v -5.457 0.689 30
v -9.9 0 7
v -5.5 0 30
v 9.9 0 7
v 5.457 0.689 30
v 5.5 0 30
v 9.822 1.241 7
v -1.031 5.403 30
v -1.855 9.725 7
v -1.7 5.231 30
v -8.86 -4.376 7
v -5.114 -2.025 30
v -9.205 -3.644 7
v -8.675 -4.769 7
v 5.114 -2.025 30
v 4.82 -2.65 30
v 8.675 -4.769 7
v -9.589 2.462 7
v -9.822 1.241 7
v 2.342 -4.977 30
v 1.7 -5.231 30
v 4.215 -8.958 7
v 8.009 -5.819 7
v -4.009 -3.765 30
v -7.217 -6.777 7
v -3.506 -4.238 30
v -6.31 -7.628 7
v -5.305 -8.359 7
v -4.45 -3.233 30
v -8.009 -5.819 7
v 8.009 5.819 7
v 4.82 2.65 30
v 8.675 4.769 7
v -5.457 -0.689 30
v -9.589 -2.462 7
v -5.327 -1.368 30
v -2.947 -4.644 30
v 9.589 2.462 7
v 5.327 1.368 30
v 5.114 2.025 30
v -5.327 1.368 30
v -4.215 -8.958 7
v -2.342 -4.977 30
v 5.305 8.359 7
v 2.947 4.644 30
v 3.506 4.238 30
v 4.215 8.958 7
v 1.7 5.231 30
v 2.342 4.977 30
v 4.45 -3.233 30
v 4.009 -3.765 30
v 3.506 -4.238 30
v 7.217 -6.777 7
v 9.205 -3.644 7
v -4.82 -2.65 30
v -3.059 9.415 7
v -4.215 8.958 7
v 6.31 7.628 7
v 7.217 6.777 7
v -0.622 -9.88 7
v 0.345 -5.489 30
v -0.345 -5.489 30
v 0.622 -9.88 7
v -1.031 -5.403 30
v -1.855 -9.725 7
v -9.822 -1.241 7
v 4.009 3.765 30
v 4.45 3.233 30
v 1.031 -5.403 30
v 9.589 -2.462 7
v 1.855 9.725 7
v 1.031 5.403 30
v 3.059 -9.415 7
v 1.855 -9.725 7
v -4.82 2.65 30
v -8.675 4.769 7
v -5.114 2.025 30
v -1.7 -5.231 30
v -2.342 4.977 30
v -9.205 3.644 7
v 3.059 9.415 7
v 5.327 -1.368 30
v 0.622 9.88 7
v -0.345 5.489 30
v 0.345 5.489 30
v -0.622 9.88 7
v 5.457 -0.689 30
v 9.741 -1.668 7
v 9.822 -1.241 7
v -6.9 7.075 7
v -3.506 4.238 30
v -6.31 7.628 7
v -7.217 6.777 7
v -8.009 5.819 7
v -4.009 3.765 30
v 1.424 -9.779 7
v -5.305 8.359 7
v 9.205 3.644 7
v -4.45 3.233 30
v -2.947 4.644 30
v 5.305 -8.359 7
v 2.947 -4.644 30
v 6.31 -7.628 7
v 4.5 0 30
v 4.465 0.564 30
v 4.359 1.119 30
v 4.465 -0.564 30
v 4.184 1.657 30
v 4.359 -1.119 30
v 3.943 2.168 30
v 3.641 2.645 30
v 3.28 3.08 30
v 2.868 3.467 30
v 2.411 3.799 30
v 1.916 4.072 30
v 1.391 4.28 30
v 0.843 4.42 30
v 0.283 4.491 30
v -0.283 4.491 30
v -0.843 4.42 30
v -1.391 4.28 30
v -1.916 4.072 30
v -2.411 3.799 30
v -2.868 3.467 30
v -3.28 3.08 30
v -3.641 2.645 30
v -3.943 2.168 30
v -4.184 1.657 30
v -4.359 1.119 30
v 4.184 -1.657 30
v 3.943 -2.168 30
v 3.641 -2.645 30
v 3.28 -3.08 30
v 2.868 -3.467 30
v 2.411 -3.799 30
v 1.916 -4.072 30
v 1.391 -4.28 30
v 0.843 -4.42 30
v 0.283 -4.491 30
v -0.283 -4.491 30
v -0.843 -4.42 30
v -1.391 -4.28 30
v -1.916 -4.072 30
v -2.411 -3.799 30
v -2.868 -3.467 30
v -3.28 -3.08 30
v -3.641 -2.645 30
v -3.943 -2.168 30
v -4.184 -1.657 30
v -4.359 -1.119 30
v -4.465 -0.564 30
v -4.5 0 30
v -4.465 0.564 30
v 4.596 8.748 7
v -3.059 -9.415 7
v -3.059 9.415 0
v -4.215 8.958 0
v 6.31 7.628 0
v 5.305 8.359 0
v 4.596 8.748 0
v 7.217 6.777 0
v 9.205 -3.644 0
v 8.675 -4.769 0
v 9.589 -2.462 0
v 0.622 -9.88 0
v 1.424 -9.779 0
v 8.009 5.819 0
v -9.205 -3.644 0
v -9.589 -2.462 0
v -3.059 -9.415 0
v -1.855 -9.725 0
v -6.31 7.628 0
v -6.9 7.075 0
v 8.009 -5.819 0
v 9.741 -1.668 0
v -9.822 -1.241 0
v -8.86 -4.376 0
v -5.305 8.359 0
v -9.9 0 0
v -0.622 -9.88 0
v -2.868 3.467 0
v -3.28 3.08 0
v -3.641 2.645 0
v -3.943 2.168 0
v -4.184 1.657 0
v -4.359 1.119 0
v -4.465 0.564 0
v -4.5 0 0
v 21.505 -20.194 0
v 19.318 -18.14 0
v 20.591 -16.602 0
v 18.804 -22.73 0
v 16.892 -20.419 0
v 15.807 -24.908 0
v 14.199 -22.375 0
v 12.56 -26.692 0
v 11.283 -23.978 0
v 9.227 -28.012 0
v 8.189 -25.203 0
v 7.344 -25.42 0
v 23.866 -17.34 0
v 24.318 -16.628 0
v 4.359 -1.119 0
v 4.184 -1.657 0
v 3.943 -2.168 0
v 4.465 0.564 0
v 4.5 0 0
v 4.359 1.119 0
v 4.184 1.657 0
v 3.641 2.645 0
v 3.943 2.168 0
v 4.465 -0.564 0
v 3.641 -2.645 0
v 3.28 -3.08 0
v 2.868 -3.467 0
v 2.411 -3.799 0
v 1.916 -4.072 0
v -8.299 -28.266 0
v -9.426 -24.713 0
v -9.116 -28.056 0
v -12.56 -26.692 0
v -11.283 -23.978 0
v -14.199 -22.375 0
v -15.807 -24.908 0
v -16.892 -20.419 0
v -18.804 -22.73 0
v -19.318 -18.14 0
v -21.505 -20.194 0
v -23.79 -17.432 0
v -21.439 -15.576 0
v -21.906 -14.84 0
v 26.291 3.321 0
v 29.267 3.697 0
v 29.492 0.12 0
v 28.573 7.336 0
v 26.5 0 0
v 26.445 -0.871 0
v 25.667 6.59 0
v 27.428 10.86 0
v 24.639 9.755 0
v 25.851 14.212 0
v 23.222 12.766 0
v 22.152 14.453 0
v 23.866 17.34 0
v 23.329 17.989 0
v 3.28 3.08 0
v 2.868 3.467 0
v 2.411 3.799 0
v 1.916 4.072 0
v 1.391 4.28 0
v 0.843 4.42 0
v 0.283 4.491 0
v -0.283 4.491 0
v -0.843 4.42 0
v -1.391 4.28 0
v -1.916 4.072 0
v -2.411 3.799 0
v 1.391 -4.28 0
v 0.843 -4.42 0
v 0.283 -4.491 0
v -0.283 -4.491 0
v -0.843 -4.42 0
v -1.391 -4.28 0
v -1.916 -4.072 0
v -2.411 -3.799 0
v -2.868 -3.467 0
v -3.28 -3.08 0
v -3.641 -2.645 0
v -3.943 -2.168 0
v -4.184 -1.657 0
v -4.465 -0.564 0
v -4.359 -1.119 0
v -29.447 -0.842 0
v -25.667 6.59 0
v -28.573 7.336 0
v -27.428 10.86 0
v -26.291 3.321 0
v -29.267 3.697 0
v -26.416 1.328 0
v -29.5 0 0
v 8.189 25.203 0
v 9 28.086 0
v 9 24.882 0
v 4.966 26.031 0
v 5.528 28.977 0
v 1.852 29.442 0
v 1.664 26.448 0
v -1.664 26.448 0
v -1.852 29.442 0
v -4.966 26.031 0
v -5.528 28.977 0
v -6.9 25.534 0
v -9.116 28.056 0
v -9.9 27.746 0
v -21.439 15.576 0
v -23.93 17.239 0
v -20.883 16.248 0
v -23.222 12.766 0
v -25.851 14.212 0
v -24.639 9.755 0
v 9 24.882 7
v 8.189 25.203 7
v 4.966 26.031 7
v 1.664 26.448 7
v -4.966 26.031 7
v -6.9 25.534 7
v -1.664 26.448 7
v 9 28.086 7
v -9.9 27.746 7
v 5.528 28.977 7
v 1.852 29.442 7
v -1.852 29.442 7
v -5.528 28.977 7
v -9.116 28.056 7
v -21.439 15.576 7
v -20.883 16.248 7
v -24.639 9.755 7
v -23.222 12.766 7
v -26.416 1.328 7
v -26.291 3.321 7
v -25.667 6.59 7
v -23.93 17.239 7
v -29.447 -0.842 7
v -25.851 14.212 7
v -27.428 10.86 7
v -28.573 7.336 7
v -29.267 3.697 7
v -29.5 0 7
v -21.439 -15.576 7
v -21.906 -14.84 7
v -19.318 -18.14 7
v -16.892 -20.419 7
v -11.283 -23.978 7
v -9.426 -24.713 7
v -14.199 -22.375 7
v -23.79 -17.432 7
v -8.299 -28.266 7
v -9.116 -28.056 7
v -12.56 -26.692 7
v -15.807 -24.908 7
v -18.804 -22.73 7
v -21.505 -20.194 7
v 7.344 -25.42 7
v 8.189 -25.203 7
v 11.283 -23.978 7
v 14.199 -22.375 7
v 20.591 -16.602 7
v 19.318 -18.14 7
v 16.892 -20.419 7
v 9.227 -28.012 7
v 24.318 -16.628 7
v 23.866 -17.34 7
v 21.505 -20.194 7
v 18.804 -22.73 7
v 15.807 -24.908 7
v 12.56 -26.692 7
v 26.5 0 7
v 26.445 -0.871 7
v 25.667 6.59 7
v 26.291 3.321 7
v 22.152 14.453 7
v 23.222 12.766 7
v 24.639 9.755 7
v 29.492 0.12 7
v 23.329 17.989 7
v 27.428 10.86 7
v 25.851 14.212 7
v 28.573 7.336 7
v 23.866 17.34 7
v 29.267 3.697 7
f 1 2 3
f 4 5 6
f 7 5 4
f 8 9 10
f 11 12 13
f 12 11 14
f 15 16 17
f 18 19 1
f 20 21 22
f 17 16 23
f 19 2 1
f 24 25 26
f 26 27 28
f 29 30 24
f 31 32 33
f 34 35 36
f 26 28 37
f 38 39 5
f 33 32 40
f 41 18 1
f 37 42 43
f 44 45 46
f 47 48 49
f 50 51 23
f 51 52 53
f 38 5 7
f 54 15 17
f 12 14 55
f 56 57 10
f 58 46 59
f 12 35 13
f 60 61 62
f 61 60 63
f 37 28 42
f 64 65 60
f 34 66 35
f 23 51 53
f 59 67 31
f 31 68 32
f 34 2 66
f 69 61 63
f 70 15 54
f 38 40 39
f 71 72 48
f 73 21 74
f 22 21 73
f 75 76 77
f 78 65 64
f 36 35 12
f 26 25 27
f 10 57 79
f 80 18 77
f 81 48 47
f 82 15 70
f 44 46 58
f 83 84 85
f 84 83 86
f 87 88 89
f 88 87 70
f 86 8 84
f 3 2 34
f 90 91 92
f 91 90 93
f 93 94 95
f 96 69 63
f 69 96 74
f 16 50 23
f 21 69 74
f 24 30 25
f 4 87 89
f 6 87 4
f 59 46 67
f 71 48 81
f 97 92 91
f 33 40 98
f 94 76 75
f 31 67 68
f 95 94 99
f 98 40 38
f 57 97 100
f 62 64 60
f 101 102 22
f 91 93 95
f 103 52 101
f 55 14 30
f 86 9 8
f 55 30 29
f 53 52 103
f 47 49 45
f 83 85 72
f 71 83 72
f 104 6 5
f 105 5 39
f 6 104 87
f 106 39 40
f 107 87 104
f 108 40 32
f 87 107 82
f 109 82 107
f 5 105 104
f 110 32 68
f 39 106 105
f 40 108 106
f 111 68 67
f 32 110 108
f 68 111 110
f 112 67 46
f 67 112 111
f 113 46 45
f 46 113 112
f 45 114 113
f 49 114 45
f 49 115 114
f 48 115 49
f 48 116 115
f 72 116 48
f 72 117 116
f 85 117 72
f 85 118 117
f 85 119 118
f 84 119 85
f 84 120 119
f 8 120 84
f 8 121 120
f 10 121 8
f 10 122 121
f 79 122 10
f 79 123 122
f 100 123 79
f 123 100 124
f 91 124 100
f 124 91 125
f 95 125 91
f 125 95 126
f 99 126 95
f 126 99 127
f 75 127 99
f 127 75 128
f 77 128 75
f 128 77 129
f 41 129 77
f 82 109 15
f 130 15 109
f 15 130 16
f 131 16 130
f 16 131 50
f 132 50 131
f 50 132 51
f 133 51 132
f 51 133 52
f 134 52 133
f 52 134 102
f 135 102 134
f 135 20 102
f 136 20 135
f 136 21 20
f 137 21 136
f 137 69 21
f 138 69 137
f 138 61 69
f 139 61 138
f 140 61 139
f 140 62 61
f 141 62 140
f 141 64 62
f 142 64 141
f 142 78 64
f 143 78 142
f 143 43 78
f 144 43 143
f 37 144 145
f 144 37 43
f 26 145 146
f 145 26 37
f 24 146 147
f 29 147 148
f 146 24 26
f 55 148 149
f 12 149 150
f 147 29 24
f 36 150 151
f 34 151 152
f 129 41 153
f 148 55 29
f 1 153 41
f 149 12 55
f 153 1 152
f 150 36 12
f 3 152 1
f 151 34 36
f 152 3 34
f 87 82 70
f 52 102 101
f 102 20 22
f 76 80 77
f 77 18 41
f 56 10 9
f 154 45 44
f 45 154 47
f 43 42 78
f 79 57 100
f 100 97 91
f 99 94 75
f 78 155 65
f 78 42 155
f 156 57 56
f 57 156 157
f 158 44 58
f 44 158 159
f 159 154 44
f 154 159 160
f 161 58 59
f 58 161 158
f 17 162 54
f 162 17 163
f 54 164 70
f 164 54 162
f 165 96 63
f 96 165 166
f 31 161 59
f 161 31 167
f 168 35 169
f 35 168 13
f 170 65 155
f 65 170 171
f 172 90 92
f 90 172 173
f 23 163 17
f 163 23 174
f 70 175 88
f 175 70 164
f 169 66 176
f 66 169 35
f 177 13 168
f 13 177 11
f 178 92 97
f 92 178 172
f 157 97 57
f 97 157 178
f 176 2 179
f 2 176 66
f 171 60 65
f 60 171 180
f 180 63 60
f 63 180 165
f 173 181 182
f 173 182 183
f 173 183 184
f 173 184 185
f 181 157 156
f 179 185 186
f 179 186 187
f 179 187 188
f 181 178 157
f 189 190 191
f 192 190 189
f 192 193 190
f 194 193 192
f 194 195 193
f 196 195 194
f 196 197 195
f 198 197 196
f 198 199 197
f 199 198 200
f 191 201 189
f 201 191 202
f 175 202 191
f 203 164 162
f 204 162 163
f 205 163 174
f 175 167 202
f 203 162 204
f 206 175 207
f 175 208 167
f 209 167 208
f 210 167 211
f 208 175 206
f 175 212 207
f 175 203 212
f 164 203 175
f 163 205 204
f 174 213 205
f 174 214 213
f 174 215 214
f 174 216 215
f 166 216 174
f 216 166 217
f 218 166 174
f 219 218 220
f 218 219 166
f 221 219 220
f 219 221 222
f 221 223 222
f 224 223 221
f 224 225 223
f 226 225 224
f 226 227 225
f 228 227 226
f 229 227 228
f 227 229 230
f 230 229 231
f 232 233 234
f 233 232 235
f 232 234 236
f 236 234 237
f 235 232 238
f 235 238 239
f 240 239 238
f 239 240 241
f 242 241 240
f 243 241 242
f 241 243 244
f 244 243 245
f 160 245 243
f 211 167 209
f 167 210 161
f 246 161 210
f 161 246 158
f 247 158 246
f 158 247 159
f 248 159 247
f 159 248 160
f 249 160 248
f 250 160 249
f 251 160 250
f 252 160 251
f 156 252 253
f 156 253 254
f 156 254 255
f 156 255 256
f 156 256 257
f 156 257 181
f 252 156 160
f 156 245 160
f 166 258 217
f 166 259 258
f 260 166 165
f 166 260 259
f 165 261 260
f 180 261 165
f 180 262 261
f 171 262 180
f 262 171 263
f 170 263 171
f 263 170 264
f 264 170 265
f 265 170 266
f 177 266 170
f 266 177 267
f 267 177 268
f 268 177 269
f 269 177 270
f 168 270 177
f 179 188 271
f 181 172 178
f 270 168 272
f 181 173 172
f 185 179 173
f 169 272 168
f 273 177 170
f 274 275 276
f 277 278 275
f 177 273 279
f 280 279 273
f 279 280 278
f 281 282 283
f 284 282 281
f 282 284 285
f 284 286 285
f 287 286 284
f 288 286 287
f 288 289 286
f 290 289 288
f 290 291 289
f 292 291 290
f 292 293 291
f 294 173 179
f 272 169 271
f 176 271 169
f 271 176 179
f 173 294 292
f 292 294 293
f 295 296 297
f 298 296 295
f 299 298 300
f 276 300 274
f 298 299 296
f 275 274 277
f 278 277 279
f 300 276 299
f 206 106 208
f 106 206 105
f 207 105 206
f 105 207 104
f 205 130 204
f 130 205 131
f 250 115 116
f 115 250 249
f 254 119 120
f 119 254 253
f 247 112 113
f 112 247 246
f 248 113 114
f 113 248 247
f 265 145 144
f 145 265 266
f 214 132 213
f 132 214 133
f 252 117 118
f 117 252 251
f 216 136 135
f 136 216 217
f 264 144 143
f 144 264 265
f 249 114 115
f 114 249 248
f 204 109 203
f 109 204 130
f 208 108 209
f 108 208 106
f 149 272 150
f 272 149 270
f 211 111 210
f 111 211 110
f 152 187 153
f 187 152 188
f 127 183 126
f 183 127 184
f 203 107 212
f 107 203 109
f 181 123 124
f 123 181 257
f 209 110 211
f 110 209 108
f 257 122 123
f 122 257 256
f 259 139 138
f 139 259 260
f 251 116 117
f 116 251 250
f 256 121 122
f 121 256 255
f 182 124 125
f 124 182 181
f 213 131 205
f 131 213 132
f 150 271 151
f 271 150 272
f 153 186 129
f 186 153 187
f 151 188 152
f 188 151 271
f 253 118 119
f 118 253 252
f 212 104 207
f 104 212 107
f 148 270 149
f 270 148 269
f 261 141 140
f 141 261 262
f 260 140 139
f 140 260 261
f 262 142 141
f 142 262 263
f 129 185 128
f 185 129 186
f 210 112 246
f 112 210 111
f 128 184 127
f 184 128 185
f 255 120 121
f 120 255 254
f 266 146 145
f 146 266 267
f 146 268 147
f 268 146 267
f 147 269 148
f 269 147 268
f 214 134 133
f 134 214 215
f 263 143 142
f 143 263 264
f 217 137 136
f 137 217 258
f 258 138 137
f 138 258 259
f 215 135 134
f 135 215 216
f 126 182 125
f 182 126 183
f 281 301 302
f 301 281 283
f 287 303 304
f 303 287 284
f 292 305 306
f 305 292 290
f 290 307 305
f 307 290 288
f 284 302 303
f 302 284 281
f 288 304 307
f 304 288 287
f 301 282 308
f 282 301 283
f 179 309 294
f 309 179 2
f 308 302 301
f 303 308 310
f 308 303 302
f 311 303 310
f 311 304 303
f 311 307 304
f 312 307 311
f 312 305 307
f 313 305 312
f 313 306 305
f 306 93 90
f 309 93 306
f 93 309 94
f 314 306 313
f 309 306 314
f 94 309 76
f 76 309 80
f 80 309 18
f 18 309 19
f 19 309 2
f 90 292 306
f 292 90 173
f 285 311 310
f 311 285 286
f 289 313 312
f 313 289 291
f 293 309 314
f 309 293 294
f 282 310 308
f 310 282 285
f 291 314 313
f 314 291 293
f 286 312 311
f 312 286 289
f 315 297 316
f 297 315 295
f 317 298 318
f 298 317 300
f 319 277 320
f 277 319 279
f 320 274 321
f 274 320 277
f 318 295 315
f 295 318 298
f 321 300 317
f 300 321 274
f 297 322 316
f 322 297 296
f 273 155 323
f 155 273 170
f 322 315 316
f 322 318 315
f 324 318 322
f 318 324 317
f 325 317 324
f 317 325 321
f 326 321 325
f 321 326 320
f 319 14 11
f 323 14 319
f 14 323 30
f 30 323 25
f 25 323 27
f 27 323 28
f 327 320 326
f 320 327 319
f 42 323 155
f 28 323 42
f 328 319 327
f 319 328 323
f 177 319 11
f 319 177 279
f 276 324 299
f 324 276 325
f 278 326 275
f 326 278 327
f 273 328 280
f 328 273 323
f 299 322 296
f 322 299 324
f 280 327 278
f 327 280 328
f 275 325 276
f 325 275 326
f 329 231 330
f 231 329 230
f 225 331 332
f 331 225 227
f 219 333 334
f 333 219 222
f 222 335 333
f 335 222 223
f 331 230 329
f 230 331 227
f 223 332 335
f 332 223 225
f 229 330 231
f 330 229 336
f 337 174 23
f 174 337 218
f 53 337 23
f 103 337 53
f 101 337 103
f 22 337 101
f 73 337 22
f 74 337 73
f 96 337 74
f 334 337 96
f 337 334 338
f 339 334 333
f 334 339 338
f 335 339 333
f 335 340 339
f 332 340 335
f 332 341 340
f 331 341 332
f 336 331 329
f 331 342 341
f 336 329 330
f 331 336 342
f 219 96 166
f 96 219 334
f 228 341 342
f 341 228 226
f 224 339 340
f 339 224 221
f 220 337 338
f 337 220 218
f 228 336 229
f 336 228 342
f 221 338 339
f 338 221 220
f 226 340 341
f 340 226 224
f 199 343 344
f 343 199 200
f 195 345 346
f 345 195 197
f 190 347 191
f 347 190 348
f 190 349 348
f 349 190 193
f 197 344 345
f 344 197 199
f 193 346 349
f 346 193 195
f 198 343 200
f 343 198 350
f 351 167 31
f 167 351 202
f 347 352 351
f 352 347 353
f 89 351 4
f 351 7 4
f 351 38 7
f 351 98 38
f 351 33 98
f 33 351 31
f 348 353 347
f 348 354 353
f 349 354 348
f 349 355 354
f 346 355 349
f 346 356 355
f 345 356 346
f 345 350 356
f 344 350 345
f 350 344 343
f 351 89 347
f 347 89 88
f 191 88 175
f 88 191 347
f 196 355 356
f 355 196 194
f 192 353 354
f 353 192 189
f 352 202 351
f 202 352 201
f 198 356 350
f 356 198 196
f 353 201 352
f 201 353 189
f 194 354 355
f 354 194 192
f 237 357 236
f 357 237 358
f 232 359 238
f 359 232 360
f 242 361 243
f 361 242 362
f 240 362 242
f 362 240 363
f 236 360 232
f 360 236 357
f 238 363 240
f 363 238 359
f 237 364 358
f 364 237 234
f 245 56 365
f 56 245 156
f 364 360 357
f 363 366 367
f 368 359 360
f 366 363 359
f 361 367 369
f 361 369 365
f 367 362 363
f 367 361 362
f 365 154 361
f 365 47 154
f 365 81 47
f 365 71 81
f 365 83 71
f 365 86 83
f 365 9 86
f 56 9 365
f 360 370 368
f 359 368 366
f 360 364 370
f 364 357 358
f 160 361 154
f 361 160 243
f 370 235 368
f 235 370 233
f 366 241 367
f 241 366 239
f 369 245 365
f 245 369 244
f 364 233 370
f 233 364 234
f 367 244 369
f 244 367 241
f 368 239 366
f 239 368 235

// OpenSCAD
// of the spool hole
diameter = 59; // [20:75]

rod_diameter = 9; // [4:15]

leg_thickness = 3; // [2:10]

leg_count = 5; // [3:7]

// of the bottom part
height = 7; // [5:20]

overall_height = 30; // [20:60]

/////////////////////////////////////////////////////////


// color([1, 0, 0, 0.5]) import("SpoolInsert.stl");

module leg() {
	intersection() {
		translate([0,0,-2]) cylinder(r=diameter/2, h=height+4, $fn=50);
		union() {
			translate([-rod_diameter*1.1, 0, 0]) cube([leg_thickness, diameter*0.6, height]);
			difference() {
				cylinder(r=diameter/2+1, h=height, $fn=50);
				translate([0,0,-1]) union() {
					cylinder(r=diameter/2-leg_thickness, h=height+2, $fn=50);
					translate([rod_diameter, -diameter, 0]) cube([diameter, diameter*2, height+2]);
					translate([-diameter-rod_diameter*1.1, -diameter, 0]) cube([diameter, diameter*2, height+2]);
					translate([-diameter, -diameter, 0]) cube([diameter*2, diameter, height+2]);
				}
			}
		}	
	}
}

module spool_insert() {
	// the main body
	difference() {
		union() {
			translate([0, 0, height]) cylinder(r1=rod_diameter*1.1, r2=rod_diameter/2+1, h=overall_height-height, $fn=50);
			cylinder(r=rod_diameter*1.1, h=height, $fn=50);
		}
		translate([0, 0, -1]) cylinder(r=rod_diameter/2, h=overall_height+2, $fn=50);
	}

	// and legs
	for(i=[0:leg_count-1])
		rotate(i*360/leg_count, [0,0,1]) leg();
}

////////////////////////////////////////////////////////

spool_insert();
